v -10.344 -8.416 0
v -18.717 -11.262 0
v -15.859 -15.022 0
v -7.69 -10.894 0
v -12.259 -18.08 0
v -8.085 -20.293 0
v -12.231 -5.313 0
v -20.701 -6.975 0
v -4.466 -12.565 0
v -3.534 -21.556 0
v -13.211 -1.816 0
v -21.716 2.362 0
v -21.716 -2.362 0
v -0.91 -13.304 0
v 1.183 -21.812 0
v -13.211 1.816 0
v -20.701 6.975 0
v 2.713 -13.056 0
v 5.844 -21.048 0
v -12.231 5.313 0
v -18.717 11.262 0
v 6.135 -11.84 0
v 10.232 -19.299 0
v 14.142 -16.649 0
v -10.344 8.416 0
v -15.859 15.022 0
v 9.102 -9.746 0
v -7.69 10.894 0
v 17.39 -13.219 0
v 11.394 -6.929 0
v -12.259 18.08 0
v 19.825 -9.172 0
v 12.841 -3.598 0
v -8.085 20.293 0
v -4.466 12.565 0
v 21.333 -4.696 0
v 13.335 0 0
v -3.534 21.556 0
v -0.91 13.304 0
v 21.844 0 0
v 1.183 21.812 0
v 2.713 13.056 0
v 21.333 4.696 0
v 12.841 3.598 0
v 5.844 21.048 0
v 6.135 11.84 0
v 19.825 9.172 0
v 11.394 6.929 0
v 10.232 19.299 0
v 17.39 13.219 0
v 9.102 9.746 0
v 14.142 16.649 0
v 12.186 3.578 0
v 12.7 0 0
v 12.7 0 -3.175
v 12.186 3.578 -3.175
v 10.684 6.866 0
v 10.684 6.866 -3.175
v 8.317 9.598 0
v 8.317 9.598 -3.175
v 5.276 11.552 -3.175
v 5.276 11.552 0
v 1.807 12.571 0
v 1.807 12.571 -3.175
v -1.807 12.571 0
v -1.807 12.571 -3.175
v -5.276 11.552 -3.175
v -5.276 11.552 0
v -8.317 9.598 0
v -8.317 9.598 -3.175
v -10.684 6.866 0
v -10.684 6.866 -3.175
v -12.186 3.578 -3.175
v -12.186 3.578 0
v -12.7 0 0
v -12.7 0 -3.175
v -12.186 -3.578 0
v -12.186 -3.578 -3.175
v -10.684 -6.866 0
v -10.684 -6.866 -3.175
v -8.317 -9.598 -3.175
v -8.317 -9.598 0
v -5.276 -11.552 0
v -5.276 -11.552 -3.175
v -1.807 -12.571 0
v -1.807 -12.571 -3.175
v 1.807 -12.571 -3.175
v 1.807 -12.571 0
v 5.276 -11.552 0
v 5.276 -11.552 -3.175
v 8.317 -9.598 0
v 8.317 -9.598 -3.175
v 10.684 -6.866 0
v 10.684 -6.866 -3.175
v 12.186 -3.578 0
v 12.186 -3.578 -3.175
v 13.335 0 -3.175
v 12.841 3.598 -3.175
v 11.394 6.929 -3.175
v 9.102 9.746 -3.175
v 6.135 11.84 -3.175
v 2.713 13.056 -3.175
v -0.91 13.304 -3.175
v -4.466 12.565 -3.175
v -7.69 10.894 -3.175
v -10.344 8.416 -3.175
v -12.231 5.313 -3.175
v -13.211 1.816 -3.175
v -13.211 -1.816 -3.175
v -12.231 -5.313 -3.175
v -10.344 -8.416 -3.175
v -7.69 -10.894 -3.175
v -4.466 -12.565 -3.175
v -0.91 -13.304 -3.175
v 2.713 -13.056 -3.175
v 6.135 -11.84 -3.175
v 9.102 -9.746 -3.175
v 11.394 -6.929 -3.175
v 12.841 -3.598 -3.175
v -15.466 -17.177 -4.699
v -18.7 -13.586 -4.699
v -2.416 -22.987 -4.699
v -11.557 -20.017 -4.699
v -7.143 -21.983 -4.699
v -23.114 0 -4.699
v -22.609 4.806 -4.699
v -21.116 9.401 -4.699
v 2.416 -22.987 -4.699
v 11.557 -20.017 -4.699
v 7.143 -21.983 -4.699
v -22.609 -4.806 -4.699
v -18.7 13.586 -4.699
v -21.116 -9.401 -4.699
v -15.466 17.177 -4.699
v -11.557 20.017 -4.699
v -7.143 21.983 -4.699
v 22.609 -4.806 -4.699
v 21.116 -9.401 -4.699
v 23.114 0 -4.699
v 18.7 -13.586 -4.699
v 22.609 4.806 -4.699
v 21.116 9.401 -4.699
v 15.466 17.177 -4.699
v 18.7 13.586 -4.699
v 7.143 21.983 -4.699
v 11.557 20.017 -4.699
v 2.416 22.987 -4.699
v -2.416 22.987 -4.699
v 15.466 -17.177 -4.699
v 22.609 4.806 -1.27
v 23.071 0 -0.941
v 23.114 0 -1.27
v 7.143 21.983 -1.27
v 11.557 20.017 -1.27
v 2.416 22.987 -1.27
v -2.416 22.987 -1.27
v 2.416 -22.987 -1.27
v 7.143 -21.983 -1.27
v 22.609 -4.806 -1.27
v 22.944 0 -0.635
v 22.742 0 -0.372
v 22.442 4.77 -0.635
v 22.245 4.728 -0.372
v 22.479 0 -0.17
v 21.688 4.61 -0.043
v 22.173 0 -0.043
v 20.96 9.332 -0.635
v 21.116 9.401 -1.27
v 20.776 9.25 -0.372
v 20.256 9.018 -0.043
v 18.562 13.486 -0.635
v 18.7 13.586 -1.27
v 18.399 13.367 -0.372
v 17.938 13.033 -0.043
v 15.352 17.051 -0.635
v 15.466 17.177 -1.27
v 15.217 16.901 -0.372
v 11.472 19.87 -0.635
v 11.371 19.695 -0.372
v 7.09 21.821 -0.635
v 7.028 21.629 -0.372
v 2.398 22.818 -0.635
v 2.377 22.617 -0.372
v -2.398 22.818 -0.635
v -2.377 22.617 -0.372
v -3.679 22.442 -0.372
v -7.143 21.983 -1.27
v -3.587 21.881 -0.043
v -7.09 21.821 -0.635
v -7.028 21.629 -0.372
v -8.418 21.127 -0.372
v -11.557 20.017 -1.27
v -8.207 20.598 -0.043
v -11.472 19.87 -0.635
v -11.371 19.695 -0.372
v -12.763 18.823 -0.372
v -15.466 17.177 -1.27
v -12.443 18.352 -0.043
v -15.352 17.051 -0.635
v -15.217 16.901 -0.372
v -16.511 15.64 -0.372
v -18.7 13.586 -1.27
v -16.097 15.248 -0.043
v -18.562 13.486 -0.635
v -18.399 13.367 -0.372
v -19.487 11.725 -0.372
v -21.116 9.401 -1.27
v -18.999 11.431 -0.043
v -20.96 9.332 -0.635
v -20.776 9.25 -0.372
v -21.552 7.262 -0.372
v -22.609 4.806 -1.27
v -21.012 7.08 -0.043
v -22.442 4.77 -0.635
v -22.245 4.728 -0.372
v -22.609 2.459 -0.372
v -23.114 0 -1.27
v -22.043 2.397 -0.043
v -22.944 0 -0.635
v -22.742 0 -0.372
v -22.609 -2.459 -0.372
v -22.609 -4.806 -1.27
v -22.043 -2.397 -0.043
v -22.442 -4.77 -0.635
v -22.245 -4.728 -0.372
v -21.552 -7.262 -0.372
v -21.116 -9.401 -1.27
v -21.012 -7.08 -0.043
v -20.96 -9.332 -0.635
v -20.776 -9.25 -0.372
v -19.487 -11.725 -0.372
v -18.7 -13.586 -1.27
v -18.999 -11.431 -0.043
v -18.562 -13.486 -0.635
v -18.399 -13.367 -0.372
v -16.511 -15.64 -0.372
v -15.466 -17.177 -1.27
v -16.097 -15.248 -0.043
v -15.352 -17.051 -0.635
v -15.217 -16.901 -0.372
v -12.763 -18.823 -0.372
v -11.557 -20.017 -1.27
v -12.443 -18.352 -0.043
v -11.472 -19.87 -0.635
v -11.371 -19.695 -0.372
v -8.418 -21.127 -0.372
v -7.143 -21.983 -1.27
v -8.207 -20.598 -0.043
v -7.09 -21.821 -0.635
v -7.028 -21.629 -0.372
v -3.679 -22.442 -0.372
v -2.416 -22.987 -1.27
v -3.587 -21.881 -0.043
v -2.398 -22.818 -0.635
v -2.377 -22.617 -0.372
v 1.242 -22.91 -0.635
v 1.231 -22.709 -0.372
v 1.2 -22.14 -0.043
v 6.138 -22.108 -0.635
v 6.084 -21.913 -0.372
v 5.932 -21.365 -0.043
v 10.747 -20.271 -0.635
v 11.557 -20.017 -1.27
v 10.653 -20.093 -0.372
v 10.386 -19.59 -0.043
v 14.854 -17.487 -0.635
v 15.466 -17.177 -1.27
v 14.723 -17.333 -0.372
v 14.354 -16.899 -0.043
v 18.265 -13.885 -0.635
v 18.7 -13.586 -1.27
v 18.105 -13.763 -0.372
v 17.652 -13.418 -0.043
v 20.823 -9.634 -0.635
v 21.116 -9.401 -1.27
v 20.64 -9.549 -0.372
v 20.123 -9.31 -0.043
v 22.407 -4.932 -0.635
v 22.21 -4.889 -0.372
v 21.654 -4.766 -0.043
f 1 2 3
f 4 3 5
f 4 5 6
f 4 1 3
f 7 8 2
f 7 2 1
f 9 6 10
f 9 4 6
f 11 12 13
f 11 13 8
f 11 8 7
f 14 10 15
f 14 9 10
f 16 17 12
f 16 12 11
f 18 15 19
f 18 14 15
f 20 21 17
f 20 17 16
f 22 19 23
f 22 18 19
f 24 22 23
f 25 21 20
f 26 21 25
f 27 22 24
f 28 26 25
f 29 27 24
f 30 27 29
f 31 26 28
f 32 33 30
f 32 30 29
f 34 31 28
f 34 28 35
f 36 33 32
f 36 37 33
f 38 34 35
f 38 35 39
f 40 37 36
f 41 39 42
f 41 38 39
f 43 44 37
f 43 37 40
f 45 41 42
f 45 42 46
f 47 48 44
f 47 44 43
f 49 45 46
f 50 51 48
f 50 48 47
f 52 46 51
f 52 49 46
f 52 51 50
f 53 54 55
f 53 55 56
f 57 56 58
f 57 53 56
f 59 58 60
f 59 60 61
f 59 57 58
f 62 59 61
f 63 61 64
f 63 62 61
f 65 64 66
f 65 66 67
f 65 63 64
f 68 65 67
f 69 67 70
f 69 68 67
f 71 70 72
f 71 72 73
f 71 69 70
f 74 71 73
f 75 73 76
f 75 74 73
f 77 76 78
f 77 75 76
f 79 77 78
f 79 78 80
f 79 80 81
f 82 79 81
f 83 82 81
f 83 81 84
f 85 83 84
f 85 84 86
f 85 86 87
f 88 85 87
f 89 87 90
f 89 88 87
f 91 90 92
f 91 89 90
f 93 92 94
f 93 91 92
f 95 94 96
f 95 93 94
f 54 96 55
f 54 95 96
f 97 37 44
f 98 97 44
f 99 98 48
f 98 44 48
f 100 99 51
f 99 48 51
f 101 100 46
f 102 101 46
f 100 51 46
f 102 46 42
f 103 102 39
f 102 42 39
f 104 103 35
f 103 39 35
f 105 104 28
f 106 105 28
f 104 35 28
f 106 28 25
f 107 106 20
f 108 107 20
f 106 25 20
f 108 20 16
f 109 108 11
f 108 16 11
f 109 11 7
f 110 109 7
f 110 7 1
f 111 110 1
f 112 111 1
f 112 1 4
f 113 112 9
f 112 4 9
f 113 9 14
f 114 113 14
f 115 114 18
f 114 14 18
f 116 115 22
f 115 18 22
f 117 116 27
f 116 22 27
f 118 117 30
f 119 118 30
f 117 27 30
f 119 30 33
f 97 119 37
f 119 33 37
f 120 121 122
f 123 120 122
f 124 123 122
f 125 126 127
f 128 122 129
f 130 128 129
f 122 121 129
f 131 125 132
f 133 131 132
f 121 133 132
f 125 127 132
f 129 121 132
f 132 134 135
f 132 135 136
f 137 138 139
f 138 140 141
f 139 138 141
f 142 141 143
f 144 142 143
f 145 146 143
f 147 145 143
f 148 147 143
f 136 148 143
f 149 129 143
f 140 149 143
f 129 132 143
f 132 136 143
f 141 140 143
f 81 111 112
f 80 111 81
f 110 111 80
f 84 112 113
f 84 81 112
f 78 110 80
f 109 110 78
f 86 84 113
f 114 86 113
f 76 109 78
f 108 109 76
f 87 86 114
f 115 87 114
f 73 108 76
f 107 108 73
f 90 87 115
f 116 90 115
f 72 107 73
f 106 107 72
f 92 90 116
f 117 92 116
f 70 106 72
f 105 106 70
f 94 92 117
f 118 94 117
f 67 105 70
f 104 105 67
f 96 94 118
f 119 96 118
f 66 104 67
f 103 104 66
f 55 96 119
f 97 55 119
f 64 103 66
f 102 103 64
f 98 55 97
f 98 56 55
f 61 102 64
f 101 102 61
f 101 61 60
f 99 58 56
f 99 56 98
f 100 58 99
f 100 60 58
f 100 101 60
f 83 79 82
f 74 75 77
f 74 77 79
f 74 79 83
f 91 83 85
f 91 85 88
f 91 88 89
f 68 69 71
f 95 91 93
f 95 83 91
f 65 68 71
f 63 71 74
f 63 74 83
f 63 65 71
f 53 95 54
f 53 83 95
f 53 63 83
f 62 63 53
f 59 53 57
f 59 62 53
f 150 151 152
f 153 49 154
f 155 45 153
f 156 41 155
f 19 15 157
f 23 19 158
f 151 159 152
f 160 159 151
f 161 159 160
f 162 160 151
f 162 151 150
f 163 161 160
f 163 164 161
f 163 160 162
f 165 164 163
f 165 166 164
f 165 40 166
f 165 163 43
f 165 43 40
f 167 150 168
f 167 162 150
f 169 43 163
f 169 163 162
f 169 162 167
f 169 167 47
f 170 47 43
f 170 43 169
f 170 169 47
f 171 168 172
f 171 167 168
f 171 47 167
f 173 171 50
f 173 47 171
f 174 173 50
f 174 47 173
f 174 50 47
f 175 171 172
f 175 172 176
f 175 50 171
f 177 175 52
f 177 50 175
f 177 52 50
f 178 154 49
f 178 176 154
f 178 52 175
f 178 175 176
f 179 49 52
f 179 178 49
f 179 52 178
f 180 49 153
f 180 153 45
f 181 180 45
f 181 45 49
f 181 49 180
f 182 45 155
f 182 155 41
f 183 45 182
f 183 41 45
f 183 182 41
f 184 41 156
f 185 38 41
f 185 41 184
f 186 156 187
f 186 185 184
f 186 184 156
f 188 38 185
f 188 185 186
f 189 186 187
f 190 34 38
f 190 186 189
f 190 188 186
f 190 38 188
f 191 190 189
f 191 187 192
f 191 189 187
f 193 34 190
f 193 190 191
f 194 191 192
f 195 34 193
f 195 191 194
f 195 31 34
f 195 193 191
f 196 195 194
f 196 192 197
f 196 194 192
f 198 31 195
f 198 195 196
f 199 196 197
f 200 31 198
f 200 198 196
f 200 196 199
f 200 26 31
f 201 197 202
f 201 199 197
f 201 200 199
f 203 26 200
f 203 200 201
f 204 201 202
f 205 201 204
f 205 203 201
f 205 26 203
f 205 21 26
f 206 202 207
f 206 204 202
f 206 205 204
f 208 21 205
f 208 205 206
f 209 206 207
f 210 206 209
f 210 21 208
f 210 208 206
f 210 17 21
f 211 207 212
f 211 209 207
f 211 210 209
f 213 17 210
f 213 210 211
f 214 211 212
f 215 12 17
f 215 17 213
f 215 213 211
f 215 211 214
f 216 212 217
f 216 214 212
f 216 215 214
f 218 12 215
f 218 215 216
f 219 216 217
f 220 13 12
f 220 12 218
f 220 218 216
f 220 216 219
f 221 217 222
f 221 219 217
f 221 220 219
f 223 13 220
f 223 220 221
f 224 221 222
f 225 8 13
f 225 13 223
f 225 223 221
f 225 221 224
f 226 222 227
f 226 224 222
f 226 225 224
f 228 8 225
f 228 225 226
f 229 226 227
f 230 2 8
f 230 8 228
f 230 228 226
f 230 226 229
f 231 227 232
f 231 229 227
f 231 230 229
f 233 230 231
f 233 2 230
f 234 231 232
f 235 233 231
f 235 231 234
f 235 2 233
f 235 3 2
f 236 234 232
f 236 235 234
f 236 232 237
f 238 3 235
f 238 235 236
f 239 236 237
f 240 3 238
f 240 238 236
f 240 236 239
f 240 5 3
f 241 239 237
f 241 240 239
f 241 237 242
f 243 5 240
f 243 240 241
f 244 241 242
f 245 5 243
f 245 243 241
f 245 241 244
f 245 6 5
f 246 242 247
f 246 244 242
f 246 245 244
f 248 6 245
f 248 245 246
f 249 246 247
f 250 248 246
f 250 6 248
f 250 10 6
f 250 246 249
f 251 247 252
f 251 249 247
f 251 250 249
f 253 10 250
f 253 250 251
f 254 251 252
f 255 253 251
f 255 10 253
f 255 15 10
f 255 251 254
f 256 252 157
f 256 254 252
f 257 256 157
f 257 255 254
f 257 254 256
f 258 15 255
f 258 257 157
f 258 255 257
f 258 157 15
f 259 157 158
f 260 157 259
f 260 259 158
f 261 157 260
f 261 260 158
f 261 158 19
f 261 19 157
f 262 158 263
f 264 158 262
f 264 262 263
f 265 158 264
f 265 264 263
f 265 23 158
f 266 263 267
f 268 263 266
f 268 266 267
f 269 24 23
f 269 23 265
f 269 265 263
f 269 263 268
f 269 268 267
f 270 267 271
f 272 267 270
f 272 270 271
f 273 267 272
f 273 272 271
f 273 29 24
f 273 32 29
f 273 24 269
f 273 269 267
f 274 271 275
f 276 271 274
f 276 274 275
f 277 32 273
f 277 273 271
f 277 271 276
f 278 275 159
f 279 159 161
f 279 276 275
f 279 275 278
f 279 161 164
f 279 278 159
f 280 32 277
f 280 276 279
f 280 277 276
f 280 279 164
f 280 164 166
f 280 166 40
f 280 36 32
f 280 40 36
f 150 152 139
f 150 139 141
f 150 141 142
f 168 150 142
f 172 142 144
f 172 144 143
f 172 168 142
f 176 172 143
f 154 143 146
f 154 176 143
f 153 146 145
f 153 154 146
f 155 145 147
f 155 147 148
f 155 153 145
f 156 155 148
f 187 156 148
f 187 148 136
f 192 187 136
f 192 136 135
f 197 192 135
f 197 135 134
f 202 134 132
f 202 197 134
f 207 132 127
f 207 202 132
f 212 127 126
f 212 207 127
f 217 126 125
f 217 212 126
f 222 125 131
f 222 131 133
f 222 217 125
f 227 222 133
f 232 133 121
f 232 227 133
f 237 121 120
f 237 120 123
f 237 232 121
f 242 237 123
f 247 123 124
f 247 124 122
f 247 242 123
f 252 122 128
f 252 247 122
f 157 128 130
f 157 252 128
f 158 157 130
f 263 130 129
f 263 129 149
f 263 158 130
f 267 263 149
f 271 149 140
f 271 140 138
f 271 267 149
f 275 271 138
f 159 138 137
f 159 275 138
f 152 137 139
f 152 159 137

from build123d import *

# Parameters (mm, degrees)
F0_R     = 23.114
F1_DEPTH = 4.699
F2_R     = 1.27
F3_R     = 13.335
F3_R_2   = 12.7
F4_DEPTH = 3.175


with BuildPart() as f1:
    # F0 (on Top) → F1 (new body)
    with BuildSketch(Plane.XY):
        Circle(F0_R)
    extrude(amount=-F1_DEPTH)

    # F2
    f2_edges = [f1.edges().sort_by_distance(p)[0] for p in [
        (-23.114, 0, 0),
    ]]
    fillet(f2_edges, radius=F2_R)

    # F3 (on face) → F4 (cut)
    with BuildSketch(Plane.XY):
        Circle(F3_R)
        Circle(F3_R_2, mode=Mode.SUBTRACT)
    extrude(amount=-F4_DEPTH, mode=Mode.SUBTRACT)


solid = f1.part
